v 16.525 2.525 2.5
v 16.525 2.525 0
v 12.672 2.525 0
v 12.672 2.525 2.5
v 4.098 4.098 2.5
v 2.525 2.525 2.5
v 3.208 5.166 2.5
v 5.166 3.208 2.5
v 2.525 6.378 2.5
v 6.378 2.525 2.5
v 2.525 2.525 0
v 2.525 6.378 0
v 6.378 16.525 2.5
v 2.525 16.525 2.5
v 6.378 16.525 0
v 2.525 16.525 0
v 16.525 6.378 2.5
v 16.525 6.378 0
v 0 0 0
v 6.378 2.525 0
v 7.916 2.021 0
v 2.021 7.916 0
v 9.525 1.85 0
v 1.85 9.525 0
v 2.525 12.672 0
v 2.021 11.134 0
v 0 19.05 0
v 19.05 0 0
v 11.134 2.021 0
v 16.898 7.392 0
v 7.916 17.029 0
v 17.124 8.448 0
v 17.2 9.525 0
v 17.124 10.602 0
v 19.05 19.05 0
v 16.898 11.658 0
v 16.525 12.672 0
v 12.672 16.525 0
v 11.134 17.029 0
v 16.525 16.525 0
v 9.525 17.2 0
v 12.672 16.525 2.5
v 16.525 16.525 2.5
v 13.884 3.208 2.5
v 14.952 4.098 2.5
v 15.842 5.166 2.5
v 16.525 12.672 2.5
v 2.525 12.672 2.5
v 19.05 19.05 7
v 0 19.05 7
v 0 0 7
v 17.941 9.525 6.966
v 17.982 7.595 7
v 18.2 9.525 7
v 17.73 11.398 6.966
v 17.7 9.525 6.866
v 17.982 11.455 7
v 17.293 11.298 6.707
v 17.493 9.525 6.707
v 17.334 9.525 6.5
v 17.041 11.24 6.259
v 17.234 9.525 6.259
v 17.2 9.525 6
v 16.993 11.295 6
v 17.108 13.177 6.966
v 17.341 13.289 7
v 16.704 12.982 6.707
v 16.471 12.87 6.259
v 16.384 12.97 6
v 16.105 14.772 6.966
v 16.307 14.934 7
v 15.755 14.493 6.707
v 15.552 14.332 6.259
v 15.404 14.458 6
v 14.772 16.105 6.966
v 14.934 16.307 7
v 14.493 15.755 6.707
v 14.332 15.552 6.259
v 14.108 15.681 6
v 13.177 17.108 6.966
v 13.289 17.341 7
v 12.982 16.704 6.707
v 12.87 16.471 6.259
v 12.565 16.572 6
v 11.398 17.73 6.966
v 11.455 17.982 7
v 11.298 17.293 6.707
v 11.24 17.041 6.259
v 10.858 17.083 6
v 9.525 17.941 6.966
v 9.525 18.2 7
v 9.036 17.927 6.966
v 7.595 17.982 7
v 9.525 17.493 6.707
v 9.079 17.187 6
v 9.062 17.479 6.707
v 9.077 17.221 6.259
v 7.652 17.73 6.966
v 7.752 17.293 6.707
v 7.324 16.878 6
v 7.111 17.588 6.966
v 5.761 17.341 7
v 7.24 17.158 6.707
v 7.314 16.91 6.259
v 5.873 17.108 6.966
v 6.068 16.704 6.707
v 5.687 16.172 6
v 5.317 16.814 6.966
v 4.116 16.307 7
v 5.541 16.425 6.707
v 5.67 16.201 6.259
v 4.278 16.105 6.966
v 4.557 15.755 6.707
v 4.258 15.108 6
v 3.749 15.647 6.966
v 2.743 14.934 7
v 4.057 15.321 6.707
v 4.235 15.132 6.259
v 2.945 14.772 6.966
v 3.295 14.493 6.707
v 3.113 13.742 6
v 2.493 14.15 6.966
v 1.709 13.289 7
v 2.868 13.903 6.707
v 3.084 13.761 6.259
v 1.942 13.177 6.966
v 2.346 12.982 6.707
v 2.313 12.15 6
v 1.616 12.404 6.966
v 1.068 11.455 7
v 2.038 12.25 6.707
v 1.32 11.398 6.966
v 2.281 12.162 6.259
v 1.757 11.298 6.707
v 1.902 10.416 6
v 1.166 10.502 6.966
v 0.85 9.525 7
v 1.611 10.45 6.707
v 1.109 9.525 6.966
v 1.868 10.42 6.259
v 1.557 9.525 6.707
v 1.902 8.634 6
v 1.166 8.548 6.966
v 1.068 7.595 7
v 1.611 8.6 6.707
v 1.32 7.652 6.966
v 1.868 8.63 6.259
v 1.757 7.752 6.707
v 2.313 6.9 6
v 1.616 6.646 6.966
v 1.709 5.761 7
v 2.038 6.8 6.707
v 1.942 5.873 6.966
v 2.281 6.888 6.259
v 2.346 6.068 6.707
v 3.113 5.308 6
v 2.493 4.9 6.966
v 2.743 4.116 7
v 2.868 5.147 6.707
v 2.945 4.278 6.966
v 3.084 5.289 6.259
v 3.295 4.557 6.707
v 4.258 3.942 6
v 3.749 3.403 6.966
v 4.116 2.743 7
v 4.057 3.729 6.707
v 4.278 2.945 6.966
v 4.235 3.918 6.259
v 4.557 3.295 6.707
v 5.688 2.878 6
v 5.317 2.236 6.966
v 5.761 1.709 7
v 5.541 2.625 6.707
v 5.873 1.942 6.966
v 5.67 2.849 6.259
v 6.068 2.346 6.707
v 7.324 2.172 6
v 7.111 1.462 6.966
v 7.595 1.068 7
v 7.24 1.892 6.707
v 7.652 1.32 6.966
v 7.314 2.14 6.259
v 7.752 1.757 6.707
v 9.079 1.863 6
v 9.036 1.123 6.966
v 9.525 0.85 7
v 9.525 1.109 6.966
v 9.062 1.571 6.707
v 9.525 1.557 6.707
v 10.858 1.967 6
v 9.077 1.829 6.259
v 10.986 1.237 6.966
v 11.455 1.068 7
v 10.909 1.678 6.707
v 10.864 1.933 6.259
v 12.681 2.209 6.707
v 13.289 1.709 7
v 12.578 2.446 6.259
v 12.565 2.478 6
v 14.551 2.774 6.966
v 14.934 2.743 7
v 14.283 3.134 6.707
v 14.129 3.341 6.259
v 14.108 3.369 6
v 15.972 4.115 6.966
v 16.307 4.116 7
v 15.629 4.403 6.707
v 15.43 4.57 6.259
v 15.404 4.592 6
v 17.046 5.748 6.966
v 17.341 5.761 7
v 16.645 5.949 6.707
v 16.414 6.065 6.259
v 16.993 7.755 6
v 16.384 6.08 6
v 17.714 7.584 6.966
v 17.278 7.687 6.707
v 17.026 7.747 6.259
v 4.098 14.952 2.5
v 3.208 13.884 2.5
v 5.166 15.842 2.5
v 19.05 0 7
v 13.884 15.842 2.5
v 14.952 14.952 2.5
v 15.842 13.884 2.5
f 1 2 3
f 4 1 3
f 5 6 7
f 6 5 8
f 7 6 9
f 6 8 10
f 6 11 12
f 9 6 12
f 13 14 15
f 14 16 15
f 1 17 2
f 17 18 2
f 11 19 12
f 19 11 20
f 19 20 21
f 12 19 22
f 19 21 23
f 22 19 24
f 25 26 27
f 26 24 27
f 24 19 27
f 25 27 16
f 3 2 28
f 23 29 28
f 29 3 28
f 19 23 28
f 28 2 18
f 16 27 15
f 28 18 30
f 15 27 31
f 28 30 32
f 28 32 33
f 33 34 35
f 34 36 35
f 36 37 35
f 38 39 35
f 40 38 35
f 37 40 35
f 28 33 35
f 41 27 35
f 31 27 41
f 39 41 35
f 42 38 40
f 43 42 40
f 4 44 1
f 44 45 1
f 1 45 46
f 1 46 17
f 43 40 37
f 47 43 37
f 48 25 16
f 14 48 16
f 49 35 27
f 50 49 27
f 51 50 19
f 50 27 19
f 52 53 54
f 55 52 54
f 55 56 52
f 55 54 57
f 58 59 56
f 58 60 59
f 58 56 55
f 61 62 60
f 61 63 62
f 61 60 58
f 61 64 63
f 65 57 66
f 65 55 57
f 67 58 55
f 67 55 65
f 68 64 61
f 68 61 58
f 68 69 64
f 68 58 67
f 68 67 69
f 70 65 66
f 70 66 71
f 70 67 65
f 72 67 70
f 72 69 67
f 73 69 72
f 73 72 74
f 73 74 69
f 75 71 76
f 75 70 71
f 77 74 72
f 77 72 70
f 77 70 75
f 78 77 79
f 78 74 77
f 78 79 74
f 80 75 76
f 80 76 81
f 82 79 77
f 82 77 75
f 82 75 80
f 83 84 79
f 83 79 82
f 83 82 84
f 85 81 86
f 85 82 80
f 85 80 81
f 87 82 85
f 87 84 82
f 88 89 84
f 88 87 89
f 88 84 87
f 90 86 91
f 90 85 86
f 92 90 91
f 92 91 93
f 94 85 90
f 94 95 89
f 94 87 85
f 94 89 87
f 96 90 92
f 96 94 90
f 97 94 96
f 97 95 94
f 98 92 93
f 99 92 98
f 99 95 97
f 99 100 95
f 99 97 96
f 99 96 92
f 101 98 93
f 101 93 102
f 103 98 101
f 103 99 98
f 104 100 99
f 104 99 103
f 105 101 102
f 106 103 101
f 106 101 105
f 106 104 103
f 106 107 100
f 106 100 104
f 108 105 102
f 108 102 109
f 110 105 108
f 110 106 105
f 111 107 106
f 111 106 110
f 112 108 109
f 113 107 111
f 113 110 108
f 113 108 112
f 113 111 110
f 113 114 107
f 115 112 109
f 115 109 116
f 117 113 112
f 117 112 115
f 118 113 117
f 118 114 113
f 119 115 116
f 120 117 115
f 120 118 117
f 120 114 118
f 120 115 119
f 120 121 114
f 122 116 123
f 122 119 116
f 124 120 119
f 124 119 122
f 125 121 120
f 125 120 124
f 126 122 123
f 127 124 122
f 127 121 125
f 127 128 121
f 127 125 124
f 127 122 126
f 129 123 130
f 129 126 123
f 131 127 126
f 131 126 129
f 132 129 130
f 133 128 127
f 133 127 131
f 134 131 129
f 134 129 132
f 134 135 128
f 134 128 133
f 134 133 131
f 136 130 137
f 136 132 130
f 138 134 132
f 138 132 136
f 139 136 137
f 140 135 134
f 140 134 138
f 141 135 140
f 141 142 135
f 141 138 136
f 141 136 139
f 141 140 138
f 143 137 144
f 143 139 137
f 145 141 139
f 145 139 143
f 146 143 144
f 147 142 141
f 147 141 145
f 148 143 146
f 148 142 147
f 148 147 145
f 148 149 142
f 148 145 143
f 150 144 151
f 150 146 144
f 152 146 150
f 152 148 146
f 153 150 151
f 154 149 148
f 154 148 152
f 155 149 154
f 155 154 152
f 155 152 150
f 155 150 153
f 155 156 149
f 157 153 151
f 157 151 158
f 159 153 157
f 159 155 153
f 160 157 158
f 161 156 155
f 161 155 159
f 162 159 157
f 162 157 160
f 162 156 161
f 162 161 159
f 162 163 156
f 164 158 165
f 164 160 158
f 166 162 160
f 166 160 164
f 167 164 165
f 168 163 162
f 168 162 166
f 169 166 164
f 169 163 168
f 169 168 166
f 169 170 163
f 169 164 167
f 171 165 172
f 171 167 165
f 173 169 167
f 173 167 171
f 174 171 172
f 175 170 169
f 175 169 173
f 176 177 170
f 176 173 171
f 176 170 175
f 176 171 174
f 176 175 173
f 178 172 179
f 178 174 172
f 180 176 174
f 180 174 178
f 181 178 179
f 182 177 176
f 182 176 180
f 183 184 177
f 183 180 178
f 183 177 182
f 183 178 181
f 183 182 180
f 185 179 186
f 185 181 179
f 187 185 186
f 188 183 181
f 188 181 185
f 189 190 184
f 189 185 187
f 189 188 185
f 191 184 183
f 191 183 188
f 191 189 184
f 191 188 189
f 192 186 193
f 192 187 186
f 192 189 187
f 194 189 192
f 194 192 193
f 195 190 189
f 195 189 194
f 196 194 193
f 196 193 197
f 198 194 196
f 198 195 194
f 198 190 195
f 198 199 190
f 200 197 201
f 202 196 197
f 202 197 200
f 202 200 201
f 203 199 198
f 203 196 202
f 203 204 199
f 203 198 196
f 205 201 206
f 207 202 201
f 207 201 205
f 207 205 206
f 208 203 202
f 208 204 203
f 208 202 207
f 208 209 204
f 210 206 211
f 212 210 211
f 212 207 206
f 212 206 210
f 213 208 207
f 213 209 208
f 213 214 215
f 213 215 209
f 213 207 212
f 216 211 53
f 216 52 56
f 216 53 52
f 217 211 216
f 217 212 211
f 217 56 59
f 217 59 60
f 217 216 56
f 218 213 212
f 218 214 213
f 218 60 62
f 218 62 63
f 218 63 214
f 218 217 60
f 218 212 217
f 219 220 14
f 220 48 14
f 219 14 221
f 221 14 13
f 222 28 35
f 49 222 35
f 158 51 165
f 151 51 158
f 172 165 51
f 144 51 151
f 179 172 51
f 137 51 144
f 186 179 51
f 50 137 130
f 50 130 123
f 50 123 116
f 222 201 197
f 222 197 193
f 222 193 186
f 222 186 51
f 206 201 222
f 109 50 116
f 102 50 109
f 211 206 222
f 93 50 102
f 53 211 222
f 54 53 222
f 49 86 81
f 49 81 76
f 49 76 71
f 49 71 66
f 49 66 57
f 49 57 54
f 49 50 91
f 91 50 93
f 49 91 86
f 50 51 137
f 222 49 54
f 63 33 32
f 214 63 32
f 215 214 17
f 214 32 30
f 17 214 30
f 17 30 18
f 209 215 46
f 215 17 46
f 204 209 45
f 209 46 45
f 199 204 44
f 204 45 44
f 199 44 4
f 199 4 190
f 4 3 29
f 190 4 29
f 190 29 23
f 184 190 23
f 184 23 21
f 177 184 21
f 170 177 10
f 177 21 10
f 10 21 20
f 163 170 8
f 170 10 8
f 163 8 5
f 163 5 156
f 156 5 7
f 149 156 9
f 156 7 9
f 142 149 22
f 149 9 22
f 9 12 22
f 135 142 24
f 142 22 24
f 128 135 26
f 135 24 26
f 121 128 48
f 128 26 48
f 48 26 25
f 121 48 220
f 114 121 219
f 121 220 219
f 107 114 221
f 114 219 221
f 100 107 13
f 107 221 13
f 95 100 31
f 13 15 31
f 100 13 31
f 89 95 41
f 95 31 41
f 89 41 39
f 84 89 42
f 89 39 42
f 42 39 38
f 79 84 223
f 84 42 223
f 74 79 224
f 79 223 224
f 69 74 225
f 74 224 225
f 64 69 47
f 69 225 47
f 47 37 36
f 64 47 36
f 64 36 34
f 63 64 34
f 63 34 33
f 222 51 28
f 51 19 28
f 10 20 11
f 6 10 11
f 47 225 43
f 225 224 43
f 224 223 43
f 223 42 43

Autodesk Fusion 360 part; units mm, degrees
sketch "Sketch1" plane through (0, 0, 0) normal (0, 0, 1) x (1, 0, 0)
  line L0 (0, 0) -> (19.05, 0)
  line L1 (19.05, 0) -> (19.05, 19.05)
  line L2 (19.05, 19.05) -> (0, 19.05)
  line L3 (0, 19.05) -> (0, 0)
  line L4 (0, 0) -> (19.05, 19.05) construction
  line L5 (0, 19.05) -> (19.05, 0) construction
  circle A0 centre (9.525, 9.525) radius 7.675
  line L6 (16.525, 2.525) -> (2.525, 2.525)
  line L7 (2.525, 2.525) -> (2.525, 16.525)
  line L8 (2.525, 16.525) -> (16.525, 16.525)
  line L9 (16.525, 16.525) -> (16.525, 2.525)
  line L10 (16.525, 2.525) -> (2.525, 16.525) construction
  line L11 (2.525, 2.525) -> (16.525, 16.525) construction
  point P0 (9.525, 9.525)
  dimension "d1" = 19.05
  dimension "d2" = 19.05
  dimension "d5" = 15.35
  dimension "d6" = 14
  dimension "d7" = 14
extrude "Extrude1" add sketch "Sketch1" along normal blind 7 contours L0 L1 L2 L3 | A0 L8 L9 | A0 L6 L9 | A0 L7 L8 | A0 L6 L7
extrude "Extrude2" cut sketch "Sketch1" along normal blind 2.5 contours A0 L8 L9 | A0 L6 L9 | A0 L7 L8 | A0 L6 L7
fillet "Fillet1" radius 1 1 edges at (2.3694, 12.3004, 7)
equation "d1 = width"
equation "d2 = height"
equation "encoder_diameter = 15.35 mm"
equation "encoder_cutout = 14 mm"
equation "d5 = encoder_diameter"
equation "d6 = encoder_cutout"
equation "d7 = encoder_cutout"
equation "shell_thickness = 7 mm"
equation "encoder_cut_height = 2.5 mm"
equation "d10 = shell_thickness"
equation "d12 = encoder_cut_height"
equation "height = 19.05 mm"
equation "width = 19.05 mm"
